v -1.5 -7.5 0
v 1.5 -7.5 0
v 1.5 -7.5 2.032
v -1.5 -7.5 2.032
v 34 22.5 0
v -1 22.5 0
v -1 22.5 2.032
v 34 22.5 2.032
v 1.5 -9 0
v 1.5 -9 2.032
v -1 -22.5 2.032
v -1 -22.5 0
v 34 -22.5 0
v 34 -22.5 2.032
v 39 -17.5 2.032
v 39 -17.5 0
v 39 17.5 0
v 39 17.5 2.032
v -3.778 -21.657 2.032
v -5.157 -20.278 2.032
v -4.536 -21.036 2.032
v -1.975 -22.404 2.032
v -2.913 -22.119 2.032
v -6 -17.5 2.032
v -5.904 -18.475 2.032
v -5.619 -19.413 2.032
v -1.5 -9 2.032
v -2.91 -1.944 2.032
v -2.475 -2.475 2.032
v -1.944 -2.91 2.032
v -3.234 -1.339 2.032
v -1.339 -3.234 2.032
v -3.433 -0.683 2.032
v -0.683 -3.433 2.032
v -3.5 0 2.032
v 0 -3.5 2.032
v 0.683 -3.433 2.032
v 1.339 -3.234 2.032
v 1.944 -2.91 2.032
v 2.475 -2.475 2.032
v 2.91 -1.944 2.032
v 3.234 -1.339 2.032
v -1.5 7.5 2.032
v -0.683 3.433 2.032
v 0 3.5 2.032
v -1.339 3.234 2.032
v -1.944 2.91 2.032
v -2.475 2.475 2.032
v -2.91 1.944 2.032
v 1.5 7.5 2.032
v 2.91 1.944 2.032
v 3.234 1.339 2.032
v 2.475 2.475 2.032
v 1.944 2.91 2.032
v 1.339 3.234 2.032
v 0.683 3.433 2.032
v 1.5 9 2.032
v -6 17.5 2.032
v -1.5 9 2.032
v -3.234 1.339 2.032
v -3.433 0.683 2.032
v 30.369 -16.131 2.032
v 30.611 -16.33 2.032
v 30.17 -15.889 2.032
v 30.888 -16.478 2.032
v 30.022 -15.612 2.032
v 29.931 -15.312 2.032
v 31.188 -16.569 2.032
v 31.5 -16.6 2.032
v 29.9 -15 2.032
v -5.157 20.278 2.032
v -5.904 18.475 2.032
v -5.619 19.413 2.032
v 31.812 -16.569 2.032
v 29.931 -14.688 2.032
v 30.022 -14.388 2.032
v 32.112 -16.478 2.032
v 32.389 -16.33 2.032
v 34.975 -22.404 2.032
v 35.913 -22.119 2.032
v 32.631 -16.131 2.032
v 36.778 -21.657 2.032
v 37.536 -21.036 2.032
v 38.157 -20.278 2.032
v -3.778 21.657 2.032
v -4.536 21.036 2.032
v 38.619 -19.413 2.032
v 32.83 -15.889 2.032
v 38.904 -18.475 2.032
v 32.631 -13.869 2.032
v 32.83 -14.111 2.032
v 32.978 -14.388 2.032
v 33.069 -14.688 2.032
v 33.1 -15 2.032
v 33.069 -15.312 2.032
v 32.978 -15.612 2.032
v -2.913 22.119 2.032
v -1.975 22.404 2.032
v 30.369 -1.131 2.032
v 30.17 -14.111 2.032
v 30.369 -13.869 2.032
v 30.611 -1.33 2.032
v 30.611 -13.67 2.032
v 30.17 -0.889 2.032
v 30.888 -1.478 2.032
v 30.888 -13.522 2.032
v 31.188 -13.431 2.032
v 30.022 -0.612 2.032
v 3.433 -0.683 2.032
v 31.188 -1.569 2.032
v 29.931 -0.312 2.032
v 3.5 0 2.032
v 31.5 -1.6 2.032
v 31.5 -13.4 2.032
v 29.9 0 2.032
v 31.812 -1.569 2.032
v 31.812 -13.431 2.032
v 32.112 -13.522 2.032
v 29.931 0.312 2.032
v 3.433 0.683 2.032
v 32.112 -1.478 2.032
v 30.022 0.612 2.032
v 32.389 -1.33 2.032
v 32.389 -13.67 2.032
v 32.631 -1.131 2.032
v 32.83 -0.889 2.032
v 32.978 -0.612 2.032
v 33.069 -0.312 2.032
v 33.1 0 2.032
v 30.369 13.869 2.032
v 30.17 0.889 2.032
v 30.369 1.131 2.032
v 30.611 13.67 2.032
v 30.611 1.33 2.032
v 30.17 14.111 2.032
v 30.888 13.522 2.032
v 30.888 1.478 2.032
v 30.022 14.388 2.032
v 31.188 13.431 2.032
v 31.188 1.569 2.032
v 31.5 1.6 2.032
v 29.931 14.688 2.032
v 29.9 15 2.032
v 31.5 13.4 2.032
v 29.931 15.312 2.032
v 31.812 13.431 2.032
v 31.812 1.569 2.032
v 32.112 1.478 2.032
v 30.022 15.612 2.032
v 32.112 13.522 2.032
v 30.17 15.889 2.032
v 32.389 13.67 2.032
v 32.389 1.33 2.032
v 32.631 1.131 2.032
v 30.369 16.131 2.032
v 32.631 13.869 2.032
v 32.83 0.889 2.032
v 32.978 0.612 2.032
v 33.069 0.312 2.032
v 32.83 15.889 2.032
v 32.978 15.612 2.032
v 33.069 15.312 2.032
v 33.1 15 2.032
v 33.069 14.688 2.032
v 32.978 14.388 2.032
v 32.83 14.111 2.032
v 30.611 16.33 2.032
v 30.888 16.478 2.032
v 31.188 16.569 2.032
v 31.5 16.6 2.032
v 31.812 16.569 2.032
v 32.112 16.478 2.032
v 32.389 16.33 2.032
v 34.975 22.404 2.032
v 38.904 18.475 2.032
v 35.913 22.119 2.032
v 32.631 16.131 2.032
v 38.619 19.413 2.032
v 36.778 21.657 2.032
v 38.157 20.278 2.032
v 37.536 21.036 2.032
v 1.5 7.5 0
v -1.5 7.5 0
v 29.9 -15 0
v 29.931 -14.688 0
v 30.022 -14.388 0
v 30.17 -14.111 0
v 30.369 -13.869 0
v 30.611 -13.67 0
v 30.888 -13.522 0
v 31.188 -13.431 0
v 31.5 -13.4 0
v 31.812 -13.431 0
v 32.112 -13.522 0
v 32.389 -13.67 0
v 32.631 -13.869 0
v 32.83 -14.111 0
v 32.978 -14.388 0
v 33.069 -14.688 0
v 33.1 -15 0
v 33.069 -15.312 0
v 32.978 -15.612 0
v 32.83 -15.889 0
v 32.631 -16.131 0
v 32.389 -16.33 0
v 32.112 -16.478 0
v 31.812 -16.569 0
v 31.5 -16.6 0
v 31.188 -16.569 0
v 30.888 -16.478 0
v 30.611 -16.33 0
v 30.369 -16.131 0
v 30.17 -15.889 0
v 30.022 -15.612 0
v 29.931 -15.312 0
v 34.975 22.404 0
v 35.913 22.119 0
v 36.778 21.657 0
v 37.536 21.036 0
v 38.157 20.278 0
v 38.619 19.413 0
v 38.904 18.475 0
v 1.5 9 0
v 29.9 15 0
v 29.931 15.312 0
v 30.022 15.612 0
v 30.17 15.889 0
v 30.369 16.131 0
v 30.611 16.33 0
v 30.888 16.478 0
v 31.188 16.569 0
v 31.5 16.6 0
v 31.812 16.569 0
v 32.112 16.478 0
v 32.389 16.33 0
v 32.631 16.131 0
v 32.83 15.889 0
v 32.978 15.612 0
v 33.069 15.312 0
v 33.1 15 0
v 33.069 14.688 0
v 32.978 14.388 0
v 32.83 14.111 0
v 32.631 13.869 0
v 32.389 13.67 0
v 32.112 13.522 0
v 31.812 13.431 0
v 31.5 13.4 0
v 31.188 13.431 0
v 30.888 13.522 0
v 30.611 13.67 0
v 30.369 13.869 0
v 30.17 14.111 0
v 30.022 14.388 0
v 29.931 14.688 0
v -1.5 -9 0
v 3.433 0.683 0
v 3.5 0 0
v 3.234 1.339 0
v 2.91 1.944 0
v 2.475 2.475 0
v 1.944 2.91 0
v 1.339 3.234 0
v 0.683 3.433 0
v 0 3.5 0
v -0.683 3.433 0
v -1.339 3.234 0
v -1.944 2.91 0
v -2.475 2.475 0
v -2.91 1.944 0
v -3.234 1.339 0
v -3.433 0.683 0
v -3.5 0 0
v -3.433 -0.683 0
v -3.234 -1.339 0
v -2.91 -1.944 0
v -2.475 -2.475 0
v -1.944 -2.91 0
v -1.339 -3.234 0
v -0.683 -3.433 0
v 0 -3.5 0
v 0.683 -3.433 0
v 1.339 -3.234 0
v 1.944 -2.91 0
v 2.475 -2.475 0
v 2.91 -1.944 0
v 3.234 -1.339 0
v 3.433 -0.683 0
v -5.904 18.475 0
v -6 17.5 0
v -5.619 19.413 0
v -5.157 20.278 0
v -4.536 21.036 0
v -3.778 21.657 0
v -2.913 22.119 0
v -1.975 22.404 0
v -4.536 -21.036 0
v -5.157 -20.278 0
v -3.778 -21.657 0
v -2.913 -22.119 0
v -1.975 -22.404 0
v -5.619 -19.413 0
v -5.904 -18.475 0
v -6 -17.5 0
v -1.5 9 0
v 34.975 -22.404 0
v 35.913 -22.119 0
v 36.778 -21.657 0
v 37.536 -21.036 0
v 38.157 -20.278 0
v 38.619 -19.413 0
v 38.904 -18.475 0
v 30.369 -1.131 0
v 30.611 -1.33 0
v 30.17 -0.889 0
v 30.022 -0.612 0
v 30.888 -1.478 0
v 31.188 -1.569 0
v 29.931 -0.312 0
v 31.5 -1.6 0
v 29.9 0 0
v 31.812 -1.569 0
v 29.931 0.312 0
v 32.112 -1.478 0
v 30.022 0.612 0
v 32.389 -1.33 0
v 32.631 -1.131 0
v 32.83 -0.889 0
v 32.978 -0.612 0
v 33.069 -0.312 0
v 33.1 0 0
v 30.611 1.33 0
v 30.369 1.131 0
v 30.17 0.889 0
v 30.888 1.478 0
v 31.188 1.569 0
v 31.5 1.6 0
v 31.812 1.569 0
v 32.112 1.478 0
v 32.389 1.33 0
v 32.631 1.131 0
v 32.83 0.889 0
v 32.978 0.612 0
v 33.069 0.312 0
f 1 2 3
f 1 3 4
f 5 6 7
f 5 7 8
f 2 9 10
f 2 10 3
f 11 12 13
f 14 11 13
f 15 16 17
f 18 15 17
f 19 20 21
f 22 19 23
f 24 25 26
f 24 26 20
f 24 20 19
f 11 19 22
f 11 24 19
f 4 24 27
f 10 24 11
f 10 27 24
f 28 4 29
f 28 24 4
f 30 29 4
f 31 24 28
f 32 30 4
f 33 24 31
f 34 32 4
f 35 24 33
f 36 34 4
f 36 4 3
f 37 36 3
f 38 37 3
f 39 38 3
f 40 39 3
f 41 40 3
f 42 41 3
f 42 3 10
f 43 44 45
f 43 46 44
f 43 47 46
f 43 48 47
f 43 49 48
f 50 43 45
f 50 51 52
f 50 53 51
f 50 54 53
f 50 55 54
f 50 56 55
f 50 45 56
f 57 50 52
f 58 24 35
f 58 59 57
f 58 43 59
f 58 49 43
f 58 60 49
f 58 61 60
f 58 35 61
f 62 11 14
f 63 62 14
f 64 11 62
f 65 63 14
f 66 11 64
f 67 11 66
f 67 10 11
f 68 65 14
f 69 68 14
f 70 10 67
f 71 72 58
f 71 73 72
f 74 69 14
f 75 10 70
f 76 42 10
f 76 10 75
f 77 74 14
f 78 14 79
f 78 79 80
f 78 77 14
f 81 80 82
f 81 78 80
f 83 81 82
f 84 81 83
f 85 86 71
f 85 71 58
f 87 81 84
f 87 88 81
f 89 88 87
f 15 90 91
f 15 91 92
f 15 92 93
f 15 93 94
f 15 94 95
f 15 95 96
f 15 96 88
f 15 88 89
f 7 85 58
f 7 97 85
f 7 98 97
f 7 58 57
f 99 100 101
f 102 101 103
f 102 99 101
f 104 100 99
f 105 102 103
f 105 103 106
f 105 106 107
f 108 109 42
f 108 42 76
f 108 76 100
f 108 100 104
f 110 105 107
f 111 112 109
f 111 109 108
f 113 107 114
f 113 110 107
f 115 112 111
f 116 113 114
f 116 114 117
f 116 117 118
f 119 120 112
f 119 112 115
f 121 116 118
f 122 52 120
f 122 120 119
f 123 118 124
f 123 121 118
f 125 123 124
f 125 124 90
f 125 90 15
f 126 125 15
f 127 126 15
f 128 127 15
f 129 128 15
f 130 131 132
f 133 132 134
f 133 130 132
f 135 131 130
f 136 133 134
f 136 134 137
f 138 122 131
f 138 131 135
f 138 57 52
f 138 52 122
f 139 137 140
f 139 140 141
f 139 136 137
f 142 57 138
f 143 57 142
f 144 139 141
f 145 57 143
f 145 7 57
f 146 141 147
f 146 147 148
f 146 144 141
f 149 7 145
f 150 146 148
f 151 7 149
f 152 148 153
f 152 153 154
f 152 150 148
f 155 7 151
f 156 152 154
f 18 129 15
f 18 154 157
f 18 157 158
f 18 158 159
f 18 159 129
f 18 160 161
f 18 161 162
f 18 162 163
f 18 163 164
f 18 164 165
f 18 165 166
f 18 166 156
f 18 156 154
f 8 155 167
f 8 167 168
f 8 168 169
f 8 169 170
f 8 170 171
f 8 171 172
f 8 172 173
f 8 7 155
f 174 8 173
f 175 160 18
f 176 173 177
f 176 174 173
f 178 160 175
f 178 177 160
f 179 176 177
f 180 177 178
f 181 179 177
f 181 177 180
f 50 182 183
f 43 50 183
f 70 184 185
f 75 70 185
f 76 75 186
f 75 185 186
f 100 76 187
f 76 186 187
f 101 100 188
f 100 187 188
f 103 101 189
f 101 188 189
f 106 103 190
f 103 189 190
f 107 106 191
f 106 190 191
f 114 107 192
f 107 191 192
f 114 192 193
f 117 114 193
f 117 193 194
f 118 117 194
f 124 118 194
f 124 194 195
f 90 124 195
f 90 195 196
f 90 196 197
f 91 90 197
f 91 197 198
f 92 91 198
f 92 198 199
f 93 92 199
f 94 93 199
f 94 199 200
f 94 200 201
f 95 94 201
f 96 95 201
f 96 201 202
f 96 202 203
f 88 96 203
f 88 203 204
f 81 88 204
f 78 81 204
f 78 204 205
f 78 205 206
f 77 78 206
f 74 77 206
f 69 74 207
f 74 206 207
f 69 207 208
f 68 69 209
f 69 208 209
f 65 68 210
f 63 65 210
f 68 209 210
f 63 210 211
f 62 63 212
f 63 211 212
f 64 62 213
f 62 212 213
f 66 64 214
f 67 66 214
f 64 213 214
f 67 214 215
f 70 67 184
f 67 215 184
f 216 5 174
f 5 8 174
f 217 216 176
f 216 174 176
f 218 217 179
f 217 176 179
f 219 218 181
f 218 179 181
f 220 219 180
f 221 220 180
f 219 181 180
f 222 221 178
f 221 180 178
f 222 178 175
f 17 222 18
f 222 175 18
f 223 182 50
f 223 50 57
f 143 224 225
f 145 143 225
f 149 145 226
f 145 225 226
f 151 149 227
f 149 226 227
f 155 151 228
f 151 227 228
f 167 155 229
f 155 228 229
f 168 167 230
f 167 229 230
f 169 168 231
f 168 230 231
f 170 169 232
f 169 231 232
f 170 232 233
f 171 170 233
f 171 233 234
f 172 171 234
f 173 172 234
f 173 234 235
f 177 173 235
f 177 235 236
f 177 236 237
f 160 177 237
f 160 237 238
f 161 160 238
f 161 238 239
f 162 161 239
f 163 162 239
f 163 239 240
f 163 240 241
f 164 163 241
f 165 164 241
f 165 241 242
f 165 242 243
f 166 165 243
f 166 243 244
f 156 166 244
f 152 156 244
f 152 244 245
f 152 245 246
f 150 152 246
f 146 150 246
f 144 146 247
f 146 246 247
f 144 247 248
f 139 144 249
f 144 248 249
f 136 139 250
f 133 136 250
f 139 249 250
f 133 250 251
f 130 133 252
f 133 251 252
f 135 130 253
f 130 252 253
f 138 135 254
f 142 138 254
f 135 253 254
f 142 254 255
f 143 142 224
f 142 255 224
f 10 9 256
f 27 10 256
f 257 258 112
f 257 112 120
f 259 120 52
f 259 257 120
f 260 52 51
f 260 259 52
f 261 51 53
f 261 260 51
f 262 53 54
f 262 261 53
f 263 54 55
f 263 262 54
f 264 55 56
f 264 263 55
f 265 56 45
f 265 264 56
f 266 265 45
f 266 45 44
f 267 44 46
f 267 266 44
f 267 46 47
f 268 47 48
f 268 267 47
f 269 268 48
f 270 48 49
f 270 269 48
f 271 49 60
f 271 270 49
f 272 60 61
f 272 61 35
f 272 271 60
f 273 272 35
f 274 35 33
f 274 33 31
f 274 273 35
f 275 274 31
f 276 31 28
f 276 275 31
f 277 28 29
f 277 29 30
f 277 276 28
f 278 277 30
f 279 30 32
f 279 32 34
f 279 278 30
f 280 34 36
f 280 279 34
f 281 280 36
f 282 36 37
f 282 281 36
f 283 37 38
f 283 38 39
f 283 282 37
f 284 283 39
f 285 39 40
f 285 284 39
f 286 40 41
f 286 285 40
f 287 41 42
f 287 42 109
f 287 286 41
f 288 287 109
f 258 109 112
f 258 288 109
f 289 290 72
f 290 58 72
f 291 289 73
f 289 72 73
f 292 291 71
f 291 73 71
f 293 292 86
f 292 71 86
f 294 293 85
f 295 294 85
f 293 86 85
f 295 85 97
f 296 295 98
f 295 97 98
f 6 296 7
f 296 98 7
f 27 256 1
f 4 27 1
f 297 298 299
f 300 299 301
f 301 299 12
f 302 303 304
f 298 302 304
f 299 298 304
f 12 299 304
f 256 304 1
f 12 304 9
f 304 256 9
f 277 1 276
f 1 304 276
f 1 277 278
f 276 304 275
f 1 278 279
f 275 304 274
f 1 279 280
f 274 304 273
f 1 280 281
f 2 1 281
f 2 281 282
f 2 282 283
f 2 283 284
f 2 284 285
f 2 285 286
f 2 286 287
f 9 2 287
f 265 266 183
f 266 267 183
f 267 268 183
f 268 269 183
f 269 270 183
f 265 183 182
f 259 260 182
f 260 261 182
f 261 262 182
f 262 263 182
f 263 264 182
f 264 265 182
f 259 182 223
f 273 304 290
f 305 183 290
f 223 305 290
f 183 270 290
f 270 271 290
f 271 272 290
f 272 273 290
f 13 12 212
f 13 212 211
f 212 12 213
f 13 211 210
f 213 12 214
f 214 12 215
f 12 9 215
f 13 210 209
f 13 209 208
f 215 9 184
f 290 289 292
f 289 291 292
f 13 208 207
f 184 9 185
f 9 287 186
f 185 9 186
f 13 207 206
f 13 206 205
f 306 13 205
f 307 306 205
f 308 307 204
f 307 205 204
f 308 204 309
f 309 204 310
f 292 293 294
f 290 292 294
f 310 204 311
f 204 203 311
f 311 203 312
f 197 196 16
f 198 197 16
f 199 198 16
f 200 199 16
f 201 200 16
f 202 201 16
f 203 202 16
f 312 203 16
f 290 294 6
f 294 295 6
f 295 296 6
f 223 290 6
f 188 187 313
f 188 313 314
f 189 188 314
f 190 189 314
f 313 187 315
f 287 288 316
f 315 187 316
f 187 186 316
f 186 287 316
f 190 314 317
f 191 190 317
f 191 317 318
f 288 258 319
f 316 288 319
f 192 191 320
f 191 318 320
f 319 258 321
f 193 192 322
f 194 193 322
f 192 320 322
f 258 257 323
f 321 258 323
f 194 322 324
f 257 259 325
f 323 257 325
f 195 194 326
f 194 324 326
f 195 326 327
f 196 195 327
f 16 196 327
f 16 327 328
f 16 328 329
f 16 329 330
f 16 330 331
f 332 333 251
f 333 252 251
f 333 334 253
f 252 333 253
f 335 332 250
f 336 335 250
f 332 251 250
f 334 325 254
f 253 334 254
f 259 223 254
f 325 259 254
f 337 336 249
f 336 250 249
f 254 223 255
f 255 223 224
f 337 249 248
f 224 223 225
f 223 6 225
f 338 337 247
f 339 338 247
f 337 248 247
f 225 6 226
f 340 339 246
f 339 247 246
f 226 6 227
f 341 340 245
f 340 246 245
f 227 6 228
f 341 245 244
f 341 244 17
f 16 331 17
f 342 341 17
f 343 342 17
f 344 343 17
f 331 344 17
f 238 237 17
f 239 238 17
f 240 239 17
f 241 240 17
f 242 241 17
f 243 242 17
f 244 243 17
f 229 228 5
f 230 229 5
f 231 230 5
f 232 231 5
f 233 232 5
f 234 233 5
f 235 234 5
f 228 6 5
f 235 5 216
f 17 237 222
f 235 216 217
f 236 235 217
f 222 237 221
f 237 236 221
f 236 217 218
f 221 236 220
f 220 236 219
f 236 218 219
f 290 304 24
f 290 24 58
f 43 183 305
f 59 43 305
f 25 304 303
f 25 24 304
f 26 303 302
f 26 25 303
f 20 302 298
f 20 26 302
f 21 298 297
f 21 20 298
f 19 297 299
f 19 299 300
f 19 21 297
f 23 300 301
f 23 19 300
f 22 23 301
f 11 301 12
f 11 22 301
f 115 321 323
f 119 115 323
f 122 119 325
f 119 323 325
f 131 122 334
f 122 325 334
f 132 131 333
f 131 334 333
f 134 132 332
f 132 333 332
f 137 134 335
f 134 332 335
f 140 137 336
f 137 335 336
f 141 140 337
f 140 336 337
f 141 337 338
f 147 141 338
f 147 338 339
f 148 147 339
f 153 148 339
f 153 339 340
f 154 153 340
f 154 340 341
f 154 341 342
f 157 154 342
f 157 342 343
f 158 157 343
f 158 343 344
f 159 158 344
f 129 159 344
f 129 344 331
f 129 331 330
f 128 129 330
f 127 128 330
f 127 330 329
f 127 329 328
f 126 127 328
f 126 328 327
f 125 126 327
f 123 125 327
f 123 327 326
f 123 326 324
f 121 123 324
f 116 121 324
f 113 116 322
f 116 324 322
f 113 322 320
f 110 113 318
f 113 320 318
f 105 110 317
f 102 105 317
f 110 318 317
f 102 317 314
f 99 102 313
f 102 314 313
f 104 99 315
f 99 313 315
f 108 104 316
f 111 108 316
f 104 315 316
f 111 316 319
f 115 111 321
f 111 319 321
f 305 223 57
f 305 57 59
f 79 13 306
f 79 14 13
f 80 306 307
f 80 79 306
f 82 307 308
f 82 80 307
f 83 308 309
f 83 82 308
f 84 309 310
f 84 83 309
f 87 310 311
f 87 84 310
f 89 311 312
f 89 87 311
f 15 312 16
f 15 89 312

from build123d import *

# Parameters (mm, degrees)
SKETCH1_W           = 45
SKETCH1_H           = 45
SKETCH1_R           = 3.5
BOSS_EXTRUDE1_DEPTH = 2.032
FILLET2_R           = 5
SKETCH4_R           = 1.6
CUT_EXTRUDE3_DEPTH  = 3.032
SKETCH5_W           = 3
SKETCH5_H           = 1.5
CUT_EXTRUDE5_DEPTH  = 3.032


with BuildPart() as part:
    # Sketch1 → Boss-Extrude1 (new body)
    with BuildSketch(Plane.XY):
        with Locations((16.5, 0)):
            Rectangle(SKETCH1_W, SKETCH1_H)
        Circle(SKETCH1_R, mode=Mode.SUBTRACT)
    extrude(amount=BOSS_EXTRUDE1_DEPTH)

    # Fillet2
    fillet2_edges = [part.edges().sort_by_distance(p)[0] for p in [
        (39, -22.5, 1.016),
        (-6, -22.5, 1.016),
        (-6, 22.5, 1.016),
        (39, 22.5, 1.016),
    ]]
    fillet(fillet2_edges, radius=FILLET2_R)

    # Sketch4 → Cut-Extrude3 (cut, through all)
    with BuildSketch(Plane(origin=(0, 0, 0), x_dir=(-1, 0, 0), z_dir=(0, 0, -1))):
        with Locations((-31.5, 15)):
            Circle(SKETCH4_R)
        with Locations((-31.5, 0)):
            Circle(SKETCH4_R)
        with Locations((-31.5, -15)):
            Circle(SKETCH4_R)
    extrude(amount=-CUT_EXTRUDE3_DEPTH, mode=Mode.SUBTRACT)

    # Sketch5 → Cut-Extrude5 (cut, through all)
    with BuildSketch(Plane(origin=(0, 0, 0), x_dir=(-1, 0, 0), z_dir=(0, 0, -1))):
        with Locations((0, 8.25)):
            Rectangle(SKETCH5_W, SKETCH5_H)
        with Locations((0, -8.25)):
            Rectangle(SKETCH5_W, SKETCH5_H)
    extrude(amount=-CUT_EXTRUDE5_DEPTH, mode=Mode.SUBTRACT)


solid = part.part
